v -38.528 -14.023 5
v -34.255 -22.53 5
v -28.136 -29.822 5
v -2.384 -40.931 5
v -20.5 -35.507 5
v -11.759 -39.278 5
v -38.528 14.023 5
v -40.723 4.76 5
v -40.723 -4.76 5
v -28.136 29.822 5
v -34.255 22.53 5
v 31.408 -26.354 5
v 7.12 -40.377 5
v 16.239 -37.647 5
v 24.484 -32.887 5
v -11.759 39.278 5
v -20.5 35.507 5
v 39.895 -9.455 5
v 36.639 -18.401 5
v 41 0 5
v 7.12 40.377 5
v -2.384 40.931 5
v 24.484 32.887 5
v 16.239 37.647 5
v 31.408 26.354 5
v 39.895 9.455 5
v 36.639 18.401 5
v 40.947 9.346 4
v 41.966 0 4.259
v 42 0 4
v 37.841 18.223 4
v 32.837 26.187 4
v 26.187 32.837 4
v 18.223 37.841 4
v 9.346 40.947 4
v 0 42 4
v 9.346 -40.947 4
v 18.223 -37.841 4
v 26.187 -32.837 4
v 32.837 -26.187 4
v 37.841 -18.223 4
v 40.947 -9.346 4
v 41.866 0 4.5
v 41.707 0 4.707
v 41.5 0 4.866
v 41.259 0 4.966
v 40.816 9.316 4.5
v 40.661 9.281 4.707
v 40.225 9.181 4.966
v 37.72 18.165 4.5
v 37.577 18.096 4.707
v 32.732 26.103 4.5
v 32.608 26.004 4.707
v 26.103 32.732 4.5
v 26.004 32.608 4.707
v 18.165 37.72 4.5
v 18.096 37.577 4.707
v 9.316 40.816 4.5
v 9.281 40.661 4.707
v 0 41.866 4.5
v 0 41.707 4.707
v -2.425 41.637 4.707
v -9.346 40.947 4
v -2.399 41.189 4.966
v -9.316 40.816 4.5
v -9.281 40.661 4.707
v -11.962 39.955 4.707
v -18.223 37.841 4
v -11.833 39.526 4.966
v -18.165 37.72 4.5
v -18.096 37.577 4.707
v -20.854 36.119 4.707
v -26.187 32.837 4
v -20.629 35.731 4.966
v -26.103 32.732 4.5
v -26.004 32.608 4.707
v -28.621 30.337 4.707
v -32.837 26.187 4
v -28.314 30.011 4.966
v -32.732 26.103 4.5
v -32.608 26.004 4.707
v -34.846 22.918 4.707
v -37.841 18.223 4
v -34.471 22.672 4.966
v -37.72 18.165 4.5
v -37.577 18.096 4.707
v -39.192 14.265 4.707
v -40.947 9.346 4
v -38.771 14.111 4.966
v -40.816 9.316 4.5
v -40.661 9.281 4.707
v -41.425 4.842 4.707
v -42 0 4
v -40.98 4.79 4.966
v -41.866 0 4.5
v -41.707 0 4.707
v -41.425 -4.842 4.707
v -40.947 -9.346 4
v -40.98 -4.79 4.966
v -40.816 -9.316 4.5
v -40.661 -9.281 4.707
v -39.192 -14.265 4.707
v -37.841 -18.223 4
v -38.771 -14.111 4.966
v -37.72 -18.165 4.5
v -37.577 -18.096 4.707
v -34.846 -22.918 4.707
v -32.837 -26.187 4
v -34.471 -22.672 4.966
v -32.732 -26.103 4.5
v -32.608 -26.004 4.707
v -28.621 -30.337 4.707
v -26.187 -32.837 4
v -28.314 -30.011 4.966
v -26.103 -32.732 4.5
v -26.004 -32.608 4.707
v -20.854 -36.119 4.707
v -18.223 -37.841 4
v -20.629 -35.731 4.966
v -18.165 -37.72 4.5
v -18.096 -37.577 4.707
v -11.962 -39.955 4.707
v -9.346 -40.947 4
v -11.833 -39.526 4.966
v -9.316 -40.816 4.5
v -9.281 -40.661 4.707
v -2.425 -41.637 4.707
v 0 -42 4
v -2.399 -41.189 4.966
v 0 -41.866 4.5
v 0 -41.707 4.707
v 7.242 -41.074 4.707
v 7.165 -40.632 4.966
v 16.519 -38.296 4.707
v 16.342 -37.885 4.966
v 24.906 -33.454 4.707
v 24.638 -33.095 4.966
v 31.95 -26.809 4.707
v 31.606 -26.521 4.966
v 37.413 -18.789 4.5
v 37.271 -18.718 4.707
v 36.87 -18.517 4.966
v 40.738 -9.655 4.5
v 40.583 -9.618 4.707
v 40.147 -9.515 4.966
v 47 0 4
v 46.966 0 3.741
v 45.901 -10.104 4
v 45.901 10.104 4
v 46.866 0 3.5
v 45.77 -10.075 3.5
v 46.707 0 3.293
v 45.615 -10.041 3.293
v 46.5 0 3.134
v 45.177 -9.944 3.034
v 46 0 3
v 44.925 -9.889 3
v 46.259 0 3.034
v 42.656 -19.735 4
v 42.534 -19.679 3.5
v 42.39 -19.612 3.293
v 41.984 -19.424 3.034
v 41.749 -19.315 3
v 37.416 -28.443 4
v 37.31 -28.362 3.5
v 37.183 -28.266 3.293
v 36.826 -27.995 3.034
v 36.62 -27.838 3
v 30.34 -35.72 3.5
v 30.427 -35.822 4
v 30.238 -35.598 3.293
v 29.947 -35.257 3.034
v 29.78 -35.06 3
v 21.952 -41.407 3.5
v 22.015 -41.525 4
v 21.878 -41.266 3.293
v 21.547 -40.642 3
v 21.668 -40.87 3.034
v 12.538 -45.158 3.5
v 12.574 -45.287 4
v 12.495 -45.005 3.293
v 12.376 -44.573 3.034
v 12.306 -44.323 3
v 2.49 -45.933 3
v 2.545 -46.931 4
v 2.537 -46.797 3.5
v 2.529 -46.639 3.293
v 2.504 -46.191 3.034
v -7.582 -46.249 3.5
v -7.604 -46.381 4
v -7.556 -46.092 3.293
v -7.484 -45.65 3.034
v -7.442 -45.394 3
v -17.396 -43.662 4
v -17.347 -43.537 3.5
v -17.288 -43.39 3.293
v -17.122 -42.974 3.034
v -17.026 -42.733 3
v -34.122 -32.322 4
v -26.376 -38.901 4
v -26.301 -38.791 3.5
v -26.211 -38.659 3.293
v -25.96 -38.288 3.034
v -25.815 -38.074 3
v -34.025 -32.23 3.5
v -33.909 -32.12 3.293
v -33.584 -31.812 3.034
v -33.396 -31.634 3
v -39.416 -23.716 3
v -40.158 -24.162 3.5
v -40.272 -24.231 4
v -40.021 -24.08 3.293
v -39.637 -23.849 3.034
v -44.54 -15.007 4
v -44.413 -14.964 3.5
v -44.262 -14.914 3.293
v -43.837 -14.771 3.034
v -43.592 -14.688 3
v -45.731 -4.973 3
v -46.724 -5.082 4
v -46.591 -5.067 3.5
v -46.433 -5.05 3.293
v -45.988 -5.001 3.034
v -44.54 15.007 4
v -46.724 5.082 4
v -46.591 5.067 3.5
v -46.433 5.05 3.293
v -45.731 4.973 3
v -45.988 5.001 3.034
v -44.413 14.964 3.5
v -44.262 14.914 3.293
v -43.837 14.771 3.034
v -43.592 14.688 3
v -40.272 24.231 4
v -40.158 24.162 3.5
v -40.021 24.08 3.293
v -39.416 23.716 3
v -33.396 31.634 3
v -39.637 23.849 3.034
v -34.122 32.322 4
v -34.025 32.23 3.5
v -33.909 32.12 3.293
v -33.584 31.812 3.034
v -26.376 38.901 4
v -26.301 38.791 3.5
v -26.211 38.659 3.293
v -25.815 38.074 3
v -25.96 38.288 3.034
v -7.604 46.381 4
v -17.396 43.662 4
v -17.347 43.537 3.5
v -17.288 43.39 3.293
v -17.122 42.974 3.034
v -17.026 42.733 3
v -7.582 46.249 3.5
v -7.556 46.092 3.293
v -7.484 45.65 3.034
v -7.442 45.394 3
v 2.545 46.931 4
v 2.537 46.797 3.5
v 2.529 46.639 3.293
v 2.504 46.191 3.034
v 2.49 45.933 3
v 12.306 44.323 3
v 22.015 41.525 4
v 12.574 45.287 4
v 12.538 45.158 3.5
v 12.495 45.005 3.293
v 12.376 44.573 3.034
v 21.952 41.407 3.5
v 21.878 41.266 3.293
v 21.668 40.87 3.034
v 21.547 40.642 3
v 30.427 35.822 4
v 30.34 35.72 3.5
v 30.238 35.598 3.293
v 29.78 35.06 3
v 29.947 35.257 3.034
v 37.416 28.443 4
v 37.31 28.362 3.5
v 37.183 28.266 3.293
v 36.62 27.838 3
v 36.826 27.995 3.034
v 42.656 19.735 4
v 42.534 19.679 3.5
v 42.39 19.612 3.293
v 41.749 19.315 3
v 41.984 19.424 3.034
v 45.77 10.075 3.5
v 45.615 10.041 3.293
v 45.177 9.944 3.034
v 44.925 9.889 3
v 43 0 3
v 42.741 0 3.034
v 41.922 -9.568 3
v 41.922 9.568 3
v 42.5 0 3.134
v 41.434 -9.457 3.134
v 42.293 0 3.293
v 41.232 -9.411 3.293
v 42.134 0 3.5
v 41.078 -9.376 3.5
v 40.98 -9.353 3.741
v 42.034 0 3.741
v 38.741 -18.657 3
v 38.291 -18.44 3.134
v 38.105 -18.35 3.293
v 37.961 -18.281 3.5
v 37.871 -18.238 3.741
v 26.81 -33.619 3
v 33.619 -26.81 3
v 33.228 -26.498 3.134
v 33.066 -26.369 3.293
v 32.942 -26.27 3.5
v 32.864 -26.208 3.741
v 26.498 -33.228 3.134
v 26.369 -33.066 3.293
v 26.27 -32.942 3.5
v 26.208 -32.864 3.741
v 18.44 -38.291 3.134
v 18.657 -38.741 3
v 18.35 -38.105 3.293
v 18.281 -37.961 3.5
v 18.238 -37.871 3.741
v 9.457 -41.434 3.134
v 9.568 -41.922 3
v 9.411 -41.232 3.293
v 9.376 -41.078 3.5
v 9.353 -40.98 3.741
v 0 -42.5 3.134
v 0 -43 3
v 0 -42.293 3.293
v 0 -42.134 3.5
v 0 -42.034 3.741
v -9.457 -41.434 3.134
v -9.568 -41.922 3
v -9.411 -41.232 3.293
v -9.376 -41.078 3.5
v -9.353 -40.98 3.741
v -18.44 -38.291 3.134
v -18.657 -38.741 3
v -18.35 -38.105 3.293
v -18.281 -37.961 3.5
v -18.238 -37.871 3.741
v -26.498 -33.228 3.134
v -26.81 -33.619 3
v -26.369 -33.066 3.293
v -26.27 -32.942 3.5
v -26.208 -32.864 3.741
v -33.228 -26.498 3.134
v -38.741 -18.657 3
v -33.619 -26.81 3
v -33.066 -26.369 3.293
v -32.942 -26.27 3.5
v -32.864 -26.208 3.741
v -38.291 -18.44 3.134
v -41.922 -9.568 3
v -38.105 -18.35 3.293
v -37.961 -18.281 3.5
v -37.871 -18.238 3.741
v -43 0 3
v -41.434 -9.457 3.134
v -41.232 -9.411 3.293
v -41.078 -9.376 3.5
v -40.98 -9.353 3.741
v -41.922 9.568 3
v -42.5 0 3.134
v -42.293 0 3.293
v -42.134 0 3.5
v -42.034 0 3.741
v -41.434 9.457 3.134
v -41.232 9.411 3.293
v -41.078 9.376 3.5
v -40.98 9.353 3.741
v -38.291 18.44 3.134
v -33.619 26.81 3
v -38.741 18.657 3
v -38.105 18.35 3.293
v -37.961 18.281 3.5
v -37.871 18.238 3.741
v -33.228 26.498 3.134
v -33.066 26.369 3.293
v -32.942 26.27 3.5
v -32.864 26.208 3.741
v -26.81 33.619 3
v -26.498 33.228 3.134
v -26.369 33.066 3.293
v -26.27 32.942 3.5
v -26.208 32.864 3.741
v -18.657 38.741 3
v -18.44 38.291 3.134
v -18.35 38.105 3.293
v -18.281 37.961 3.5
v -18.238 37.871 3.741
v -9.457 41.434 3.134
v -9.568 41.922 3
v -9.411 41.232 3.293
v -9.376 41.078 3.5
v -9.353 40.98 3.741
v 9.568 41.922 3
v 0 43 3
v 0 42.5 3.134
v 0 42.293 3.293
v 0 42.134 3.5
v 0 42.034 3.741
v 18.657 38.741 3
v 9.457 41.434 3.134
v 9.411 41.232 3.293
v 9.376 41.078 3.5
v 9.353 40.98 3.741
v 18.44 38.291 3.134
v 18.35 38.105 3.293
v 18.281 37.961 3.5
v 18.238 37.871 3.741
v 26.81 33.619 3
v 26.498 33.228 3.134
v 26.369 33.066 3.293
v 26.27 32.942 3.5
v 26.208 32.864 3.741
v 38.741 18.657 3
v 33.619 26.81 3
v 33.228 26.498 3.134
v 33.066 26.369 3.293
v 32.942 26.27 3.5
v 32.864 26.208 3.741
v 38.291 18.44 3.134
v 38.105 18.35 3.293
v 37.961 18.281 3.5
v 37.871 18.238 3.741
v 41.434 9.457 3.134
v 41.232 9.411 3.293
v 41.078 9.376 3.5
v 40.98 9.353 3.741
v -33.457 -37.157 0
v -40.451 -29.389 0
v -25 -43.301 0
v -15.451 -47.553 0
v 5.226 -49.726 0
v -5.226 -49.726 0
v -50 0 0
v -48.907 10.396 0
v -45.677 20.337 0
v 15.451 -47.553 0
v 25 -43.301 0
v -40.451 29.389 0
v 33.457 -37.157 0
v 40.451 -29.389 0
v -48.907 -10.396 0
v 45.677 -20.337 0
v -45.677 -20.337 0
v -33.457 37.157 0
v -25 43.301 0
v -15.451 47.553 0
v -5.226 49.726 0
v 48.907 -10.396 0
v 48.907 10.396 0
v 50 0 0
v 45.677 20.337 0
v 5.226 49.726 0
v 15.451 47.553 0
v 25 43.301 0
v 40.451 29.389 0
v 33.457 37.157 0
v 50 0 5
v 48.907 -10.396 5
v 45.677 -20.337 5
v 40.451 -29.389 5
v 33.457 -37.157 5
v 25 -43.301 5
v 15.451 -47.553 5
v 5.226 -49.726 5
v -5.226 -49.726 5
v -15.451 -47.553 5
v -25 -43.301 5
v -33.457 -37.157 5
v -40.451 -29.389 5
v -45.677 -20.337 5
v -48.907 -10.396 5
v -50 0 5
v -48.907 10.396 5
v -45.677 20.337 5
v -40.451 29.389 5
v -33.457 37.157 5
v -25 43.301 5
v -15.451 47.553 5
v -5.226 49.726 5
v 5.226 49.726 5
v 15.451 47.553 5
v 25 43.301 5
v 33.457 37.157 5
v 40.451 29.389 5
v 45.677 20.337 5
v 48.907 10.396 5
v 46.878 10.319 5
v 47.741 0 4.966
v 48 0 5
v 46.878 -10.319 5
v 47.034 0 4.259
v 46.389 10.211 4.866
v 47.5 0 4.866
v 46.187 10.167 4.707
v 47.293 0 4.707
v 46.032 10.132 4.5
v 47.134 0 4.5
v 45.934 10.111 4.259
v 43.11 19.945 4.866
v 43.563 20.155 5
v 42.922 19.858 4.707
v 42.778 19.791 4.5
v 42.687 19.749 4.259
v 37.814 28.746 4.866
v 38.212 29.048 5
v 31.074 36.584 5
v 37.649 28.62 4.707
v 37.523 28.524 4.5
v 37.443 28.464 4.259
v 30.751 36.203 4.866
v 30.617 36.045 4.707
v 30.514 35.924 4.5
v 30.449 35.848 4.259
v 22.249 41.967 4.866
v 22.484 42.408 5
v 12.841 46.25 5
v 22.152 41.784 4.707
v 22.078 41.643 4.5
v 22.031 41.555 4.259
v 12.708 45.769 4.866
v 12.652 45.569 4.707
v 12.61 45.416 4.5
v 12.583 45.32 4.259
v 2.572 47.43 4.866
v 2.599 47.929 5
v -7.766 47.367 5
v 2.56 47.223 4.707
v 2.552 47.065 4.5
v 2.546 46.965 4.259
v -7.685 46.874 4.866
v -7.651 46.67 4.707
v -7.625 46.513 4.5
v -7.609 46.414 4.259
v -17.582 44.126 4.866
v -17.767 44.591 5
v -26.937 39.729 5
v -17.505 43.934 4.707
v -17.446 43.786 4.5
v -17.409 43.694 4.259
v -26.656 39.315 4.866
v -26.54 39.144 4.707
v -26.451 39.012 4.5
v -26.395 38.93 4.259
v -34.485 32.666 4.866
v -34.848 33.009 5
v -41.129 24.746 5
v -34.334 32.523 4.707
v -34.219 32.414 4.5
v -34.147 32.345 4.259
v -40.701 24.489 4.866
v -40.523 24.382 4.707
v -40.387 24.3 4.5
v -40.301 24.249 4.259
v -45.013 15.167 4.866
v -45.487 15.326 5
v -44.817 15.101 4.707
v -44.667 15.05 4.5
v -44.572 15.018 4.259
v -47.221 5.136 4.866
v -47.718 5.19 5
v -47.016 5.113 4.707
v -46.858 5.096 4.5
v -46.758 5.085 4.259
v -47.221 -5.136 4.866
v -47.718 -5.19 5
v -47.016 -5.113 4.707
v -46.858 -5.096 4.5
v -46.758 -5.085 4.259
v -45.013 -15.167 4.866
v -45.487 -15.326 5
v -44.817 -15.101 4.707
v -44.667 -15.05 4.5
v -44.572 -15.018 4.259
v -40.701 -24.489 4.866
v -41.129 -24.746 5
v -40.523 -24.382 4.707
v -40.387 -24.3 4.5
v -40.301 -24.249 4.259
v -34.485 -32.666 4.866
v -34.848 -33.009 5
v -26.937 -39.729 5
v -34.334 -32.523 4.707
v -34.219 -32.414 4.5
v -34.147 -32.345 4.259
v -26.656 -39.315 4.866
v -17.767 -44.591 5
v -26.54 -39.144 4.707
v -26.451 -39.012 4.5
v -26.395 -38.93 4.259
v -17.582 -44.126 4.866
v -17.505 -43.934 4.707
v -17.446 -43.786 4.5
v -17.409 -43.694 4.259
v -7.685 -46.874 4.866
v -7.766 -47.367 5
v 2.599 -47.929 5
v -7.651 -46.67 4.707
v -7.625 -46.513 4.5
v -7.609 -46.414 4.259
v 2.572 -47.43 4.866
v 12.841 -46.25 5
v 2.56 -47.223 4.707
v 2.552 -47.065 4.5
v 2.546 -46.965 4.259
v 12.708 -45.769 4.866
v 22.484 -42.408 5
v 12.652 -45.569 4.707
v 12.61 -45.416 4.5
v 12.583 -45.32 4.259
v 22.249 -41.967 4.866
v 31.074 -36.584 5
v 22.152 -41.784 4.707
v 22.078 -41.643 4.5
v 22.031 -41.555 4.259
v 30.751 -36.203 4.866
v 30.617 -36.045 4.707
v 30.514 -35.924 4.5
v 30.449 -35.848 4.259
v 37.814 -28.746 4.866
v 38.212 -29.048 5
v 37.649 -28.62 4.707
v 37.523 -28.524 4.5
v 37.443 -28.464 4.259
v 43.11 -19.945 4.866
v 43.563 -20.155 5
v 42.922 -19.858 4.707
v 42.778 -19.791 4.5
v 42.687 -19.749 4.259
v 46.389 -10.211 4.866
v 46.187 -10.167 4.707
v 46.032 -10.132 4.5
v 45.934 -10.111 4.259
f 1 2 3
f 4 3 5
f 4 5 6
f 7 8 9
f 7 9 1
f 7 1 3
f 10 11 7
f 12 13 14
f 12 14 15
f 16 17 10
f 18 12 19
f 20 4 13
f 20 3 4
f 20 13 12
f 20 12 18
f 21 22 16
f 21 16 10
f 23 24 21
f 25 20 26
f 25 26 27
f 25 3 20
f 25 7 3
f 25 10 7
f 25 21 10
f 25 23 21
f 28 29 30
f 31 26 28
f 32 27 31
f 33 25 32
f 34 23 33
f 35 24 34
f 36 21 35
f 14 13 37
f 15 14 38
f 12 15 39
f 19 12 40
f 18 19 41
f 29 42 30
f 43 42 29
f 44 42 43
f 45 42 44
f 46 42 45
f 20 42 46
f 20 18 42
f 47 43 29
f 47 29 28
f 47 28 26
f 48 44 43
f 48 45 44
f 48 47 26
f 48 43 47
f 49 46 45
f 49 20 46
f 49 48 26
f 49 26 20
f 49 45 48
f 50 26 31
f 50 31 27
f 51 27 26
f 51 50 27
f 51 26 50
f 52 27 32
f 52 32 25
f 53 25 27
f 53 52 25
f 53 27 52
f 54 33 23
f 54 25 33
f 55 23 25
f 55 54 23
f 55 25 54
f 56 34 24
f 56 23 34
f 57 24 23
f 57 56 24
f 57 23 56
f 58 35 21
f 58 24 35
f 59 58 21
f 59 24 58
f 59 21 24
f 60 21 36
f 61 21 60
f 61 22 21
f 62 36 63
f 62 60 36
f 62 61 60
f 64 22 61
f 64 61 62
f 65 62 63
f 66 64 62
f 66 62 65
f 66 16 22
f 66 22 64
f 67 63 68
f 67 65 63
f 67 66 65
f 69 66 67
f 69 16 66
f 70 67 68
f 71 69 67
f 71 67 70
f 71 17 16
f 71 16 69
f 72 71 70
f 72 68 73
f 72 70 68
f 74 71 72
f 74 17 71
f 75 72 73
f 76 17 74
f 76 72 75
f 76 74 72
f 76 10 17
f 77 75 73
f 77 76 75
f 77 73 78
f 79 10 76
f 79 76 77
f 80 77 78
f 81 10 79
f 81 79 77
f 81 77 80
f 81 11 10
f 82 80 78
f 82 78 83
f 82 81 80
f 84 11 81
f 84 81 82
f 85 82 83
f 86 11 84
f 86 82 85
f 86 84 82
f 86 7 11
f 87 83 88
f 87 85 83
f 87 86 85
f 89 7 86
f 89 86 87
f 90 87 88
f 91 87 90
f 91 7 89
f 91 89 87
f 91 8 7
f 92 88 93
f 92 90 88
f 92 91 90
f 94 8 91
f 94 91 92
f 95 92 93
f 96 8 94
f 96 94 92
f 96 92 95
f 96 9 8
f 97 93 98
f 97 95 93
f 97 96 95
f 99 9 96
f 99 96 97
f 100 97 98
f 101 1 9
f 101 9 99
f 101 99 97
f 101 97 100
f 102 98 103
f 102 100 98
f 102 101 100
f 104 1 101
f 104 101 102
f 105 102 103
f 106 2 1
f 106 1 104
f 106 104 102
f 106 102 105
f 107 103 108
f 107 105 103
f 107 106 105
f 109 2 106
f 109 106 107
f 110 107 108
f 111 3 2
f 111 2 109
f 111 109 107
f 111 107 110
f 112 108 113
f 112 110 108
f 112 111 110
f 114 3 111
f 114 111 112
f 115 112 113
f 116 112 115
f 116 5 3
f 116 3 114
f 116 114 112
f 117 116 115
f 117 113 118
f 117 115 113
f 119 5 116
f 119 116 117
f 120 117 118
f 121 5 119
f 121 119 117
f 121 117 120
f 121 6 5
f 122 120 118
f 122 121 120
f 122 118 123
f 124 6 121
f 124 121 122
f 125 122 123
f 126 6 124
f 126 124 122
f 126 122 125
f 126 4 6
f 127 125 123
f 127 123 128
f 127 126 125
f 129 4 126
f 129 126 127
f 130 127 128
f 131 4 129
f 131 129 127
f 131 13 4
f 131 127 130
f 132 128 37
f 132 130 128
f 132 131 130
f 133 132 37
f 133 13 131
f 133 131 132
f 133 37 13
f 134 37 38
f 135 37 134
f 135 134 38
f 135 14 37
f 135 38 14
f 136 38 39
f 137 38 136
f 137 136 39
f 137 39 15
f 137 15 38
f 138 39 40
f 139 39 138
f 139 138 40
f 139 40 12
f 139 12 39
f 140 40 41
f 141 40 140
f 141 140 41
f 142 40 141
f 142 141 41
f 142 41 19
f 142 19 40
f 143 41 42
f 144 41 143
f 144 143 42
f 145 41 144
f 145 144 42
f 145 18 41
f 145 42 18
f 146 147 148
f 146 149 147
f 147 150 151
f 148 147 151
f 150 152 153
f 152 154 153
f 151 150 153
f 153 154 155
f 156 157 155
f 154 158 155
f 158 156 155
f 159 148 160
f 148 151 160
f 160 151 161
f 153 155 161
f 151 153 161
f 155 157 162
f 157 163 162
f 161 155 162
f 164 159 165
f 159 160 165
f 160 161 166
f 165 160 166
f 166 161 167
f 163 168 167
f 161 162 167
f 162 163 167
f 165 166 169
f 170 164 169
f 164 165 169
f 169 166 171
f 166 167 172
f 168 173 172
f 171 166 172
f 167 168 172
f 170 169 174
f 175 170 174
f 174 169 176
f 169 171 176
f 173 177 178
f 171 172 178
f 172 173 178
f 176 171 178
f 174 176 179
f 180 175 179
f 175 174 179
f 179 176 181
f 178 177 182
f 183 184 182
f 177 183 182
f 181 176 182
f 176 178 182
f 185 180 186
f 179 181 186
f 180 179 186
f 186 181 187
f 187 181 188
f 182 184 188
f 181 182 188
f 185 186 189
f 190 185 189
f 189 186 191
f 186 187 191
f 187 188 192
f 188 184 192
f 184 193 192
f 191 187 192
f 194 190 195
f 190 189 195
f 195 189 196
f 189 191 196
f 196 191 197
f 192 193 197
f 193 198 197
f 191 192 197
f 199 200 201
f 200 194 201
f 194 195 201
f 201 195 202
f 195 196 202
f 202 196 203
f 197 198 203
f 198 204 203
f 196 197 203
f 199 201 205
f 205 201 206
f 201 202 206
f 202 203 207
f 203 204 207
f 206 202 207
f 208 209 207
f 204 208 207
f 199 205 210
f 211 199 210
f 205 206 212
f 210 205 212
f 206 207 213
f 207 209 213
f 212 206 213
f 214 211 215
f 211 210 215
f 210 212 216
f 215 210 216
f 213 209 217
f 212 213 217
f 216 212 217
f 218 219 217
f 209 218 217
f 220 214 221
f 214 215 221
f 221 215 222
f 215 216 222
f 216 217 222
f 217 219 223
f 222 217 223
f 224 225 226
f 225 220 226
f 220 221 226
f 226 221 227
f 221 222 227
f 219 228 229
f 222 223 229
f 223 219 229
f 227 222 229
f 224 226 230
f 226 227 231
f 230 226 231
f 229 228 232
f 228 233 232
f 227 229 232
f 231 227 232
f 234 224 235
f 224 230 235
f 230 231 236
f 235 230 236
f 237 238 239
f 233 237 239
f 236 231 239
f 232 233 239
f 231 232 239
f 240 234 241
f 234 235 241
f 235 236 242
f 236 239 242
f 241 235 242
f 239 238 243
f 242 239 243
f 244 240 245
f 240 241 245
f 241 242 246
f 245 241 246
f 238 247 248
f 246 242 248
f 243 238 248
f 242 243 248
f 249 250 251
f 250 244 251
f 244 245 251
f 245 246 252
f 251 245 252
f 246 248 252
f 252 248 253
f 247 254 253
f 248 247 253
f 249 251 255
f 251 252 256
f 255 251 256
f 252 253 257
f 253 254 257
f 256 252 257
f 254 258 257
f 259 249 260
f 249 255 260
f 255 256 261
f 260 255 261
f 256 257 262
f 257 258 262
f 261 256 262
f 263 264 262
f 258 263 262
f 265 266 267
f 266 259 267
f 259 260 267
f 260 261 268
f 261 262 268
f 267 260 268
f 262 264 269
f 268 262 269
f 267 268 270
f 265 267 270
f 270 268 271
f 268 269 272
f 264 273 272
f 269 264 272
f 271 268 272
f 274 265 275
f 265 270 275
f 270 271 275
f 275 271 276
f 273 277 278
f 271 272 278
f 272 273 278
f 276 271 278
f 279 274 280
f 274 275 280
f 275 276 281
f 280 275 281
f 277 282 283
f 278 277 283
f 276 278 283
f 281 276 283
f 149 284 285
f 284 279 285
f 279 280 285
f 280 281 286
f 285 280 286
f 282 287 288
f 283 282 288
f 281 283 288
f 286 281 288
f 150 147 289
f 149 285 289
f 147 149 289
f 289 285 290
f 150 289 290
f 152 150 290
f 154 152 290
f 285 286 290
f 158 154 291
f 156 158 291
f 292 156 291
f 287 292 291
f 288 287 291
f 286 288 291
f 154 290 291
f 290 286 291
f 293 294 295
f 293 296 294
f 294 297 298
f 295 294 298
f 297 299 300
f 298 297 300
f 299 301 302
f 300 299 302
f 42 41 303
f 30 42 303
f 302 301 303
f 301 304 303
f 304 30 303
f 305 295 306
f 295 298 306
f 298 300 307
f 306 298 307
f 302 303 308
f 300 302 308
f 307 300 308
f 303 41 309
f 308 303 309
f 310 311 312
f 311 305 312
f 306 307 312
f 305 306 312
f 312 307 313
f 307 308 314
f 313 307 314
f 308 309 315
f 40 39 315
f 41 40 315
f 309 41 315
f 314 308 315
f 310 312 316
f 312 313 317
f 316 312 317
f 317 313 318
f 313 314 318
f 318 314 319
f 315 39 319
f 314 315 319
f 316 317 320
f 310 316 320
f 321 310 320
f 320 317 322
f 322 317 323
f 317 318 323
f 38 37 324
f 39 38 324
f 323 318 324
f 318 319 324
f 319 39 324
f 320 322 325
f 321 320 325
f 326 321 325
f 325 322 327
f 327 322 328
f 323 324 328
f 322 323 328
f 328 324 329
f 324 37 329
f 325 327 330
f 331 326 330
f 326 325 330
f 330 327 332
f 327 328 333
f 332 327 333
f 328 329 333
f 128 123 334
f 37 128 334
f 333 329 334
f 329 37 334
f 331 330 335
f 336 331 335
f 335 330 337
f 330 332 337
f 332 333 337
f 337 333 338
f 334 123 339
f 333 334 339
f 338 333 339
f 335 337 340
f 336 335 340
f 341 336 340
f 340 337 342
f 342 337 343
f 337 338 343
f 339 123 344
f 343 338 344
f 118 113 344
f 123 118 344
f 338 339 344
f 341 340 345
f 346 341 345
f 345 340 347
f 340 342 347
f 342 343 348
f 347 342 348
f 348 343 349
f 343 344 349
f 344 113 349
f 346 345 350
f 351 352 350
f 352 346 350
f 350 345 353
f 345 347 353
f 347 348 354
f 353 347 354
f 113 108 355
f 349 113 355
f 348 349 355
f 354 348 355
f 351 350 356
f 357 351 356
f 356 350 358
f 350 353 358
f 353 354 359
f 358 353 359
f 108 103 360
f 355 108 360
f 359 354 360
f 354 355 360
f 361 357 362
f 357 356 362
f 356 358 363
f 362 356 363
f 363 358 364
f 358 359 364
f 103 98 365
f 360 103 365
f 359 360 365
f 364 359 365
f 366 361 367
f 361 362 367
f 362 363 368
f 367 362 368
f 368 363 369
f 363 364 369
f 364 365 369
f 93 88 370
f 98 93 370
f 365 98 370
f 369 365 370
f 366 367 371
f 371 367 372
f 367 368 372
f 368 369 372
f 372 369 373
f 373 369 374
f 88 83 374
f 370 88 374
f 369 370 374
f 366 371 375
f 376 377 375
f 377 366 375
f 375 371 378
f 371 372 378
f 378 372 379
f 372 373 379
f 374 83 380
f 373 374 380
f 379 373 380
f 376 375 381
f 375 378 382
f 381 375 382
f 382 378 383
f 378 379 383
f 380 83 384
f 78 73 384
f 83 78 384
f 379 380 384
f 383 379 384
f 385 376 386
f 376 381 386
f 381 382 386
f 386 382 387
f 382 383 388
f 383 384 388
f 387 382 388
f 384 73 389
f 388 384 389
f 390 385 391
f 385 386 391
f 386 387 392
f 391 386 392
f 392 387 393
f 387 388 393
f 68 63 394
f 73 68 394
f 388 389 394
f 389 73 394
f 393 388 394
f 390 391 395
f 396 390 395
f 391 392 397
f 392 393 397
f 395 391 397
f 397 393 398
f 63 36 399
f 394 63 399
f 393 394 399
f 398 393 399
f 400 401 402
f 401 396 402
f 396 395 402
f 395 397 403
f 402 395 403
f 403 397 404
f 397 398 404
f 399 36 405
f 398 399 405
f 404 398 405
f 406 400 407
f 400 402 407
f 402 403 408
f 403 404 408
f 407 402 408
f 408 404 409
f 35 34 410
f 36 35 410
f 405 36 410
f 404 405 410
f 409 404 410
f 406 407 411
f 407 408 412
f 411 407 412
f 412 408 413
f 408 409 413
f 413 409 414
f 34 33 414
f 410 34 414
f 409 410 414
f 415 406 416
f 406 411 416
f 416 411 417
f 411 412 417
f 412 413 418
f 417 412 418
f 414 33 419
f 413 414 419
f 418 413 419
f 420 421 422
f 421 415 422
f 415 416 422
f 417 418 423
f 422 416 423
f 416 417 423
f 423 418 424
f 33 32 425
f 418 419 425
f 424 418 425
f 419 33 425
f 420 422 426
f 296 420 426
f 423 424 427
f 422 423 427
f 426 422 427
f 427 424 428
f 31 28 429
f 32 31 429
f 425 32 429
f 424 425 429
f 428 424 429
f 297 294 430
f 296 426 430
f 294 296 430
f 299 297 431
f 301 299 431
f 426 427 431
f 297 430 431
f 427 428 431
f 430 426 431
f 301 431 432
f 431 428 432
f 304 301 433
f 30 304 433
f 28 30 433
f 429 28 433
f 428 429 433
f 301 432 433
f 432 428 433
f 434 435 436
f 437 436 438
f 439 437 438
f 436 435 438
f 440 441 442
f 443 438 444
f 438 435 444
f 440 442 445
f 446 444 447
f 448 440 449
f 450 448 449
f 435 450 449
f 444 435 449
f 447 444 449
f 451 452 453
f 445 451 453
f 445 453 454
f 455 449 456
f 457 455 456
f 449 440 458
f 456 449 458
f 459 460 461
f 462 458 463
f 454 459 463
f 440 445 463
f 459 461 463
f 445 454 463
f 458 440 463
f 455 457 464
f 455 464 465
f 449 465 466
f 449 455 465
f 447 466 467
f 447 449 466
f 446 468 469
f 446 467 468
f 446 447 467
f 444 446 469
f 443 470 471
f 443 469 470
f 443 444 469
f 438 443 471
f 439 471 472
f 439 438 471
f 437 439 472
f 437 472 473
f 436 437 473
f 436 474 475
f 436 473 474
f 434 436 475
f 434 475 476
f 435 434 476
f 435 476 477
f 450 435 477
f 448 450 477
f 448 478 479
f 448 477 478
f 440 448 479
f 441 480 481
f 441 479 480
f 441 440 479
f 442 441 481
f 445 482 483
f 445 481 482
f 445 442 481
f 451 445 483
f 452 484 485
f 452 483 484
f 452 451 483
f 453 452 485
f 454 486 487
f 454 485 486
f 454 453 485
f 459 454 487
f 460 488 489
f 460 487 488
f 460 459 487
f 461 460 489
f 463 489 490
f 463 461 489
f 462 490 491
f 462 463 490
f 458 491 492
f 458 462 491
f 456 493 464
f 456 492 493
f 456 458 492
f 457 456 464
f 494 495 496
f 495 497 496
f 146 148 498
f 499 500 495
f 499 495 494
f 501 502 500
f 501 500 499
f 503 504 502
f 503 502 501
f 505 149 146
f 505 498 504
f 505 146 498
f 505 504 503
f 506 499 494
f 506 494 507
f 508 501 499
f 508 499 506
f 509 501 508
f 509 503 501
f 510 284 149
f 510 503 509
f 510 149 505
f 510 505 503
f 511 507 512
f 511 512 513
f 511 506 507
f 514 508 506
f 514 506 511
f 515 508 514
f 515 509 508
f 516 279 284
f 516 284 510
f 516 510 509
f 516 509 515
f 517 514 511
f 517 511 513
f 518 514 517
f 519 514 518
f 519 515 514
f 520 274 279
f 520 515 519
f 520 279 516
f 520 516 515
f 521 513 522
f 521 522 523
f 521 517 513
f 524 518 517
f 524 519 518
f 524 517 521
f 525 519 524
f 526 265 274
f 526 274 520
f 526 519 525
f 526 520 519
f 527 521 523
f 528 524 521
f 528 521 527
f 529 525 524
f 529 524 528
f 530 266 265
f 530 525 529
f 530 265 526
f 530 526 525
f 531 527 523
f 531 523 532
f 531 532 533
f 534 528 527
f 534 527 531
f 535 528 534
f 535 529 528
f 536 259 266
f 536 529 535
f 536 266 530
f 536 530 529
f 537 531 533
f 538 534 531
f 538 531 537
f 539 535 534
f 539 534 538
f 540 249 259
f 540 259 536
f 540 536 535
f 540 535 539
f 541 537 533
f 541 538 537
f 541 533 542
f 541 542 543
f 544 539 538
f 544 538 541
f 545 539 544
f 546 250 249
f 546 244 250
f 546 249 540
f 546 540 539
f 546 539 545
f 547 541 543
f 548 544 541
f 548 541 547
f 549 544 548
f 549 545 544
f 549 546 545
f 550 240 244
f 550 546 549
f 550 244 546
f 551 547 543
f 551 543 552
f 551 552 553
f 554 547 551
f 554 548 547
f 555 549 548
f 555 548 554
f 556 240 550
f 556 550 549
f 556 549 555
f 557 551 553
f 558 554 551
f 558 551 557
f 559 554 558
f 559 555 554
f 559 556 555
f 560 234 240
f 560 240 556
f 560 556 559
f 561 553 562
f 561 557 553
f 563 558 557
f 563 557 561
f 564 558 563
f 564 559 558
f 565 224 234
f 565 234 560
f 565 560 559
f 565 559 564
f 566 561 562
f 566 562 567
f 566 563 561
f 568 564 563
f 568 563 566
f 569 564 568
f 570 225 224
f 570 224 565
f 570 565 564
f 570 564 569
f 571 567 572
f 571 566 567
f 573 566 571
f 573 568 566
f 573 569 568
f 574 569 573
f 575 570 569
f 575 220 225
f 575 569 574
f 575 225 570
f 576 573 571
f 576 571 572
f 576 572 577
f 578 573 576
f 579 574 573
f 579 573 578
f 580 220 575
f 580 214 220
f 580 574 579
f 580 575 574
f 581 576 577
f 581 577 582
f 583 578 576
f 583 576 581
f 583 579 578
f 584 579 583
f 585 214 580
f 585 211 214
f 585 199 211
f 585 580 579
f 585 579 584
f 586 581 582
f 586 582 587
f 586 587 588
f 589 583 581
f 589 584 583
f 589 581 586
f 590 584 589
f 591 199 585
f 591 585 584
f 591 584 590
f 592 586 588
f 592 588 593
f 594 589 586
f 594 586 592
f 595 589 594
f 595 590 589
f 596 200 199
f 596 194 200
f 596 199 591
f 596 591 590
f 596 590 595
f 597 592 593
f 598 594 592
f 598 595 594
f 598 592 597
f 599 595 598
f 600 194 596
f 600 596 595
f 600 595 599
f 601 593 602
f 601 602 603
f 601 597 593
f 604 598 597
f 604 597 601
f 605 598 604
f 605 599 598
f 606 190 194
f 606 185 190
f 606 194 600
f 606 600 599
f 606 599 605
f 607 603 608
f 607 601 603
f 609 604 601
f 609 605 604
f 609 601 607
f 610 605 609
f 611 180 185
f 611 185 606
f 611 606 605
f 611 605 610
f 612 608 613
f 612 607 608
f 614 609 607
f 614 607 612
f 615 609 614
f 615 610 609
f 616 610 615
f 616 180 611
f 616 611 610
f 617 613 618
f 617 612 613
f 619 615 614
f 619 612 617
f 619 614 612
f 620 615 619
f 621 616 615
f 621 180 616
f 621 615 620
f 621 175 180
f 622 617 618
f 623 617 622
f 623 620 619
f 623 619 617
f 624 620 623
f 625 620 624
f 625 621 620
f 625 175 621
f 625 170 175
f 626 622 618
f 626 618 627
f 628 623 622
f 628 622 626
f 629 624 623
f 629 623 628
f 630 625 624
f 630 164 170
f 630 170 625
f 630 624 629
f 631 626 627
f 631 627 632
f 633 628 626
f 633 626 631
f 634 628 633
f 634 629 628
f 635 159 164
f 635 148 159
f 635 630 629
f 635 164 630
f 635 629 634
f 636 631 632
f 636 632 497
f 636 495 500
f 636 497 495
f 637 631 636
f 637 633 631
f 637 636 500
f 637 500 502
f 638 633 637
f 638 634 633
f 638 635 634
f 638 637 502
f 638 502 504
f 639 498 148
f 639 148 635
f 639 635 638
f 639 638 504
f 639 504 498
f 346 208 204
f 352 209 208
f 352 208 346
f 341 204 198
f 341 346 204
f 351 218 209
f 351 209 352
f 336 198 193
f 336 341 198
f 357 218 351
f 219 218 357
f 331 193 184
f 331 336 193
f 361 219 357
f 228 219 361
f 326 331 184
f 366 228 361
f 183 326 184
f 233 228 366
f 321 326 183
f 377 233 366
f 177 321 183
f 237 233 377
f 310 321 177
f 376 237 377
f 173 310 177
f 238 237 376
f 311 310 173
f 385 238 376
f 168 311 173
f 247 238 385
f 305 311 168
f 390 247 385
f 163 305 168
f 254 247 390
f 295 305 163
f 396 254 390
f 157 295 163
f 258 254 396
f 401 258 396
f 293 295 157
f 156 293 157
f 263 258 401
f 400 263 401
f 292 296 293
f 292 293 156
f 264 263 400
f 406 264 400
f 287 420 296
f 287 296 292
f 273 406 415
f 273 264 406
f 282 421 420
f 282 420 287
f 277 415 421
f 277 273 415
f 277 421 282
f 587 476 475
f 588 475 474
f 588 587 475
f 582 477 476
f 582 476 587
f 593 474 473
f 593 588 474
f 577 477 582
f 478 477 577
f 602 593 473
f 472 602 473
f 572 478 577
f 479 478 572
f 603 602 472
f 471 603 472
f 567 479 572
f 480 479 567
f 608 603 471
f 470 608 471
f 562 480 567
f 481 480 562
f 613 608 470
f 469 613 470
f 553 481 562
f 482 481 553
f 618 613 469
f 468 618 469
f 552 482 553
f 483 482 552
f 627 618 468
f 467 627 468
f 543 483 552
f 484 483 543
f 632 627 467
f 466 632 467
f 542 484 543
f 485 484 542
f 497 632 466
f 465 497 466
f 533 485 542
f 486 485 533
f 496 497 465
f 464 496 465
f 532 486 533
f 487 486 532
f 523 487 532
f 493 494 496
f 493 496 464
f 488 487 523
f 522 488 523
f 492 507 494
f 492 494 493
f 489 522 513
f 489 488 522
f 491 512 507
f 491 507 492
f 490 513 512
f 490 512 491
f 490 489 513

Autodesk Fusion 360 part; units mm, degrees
sketch "Sketch1" plane through (0, 0, 0) normal (0, 0, 1) x (1, 0, 0)
  circle A0 centre (0, 0) radius 50
  circle A1 centre (0, 0) radius 47
  circle A2 centre (0, 0) radius 42
  dimension "d1" = 100
  dimension "d2" = -3
  dimension "d3" = -5
extrude "Extrude1" add sketch "Sketch1" along normal blind 5 contours A0 | A1 | A2
extrude "Extrude2" cut sketch "Sketch1" against normal blind 2 from surface at 5 contours A1
fillet "Fillet1" radius 1 4 edges at (-43.8194, 16.9959, 5) (-39.1577, -15.1878, 5) (-39.1577, -15.1878, 3) (-43.8194, 16.9959, 3)
